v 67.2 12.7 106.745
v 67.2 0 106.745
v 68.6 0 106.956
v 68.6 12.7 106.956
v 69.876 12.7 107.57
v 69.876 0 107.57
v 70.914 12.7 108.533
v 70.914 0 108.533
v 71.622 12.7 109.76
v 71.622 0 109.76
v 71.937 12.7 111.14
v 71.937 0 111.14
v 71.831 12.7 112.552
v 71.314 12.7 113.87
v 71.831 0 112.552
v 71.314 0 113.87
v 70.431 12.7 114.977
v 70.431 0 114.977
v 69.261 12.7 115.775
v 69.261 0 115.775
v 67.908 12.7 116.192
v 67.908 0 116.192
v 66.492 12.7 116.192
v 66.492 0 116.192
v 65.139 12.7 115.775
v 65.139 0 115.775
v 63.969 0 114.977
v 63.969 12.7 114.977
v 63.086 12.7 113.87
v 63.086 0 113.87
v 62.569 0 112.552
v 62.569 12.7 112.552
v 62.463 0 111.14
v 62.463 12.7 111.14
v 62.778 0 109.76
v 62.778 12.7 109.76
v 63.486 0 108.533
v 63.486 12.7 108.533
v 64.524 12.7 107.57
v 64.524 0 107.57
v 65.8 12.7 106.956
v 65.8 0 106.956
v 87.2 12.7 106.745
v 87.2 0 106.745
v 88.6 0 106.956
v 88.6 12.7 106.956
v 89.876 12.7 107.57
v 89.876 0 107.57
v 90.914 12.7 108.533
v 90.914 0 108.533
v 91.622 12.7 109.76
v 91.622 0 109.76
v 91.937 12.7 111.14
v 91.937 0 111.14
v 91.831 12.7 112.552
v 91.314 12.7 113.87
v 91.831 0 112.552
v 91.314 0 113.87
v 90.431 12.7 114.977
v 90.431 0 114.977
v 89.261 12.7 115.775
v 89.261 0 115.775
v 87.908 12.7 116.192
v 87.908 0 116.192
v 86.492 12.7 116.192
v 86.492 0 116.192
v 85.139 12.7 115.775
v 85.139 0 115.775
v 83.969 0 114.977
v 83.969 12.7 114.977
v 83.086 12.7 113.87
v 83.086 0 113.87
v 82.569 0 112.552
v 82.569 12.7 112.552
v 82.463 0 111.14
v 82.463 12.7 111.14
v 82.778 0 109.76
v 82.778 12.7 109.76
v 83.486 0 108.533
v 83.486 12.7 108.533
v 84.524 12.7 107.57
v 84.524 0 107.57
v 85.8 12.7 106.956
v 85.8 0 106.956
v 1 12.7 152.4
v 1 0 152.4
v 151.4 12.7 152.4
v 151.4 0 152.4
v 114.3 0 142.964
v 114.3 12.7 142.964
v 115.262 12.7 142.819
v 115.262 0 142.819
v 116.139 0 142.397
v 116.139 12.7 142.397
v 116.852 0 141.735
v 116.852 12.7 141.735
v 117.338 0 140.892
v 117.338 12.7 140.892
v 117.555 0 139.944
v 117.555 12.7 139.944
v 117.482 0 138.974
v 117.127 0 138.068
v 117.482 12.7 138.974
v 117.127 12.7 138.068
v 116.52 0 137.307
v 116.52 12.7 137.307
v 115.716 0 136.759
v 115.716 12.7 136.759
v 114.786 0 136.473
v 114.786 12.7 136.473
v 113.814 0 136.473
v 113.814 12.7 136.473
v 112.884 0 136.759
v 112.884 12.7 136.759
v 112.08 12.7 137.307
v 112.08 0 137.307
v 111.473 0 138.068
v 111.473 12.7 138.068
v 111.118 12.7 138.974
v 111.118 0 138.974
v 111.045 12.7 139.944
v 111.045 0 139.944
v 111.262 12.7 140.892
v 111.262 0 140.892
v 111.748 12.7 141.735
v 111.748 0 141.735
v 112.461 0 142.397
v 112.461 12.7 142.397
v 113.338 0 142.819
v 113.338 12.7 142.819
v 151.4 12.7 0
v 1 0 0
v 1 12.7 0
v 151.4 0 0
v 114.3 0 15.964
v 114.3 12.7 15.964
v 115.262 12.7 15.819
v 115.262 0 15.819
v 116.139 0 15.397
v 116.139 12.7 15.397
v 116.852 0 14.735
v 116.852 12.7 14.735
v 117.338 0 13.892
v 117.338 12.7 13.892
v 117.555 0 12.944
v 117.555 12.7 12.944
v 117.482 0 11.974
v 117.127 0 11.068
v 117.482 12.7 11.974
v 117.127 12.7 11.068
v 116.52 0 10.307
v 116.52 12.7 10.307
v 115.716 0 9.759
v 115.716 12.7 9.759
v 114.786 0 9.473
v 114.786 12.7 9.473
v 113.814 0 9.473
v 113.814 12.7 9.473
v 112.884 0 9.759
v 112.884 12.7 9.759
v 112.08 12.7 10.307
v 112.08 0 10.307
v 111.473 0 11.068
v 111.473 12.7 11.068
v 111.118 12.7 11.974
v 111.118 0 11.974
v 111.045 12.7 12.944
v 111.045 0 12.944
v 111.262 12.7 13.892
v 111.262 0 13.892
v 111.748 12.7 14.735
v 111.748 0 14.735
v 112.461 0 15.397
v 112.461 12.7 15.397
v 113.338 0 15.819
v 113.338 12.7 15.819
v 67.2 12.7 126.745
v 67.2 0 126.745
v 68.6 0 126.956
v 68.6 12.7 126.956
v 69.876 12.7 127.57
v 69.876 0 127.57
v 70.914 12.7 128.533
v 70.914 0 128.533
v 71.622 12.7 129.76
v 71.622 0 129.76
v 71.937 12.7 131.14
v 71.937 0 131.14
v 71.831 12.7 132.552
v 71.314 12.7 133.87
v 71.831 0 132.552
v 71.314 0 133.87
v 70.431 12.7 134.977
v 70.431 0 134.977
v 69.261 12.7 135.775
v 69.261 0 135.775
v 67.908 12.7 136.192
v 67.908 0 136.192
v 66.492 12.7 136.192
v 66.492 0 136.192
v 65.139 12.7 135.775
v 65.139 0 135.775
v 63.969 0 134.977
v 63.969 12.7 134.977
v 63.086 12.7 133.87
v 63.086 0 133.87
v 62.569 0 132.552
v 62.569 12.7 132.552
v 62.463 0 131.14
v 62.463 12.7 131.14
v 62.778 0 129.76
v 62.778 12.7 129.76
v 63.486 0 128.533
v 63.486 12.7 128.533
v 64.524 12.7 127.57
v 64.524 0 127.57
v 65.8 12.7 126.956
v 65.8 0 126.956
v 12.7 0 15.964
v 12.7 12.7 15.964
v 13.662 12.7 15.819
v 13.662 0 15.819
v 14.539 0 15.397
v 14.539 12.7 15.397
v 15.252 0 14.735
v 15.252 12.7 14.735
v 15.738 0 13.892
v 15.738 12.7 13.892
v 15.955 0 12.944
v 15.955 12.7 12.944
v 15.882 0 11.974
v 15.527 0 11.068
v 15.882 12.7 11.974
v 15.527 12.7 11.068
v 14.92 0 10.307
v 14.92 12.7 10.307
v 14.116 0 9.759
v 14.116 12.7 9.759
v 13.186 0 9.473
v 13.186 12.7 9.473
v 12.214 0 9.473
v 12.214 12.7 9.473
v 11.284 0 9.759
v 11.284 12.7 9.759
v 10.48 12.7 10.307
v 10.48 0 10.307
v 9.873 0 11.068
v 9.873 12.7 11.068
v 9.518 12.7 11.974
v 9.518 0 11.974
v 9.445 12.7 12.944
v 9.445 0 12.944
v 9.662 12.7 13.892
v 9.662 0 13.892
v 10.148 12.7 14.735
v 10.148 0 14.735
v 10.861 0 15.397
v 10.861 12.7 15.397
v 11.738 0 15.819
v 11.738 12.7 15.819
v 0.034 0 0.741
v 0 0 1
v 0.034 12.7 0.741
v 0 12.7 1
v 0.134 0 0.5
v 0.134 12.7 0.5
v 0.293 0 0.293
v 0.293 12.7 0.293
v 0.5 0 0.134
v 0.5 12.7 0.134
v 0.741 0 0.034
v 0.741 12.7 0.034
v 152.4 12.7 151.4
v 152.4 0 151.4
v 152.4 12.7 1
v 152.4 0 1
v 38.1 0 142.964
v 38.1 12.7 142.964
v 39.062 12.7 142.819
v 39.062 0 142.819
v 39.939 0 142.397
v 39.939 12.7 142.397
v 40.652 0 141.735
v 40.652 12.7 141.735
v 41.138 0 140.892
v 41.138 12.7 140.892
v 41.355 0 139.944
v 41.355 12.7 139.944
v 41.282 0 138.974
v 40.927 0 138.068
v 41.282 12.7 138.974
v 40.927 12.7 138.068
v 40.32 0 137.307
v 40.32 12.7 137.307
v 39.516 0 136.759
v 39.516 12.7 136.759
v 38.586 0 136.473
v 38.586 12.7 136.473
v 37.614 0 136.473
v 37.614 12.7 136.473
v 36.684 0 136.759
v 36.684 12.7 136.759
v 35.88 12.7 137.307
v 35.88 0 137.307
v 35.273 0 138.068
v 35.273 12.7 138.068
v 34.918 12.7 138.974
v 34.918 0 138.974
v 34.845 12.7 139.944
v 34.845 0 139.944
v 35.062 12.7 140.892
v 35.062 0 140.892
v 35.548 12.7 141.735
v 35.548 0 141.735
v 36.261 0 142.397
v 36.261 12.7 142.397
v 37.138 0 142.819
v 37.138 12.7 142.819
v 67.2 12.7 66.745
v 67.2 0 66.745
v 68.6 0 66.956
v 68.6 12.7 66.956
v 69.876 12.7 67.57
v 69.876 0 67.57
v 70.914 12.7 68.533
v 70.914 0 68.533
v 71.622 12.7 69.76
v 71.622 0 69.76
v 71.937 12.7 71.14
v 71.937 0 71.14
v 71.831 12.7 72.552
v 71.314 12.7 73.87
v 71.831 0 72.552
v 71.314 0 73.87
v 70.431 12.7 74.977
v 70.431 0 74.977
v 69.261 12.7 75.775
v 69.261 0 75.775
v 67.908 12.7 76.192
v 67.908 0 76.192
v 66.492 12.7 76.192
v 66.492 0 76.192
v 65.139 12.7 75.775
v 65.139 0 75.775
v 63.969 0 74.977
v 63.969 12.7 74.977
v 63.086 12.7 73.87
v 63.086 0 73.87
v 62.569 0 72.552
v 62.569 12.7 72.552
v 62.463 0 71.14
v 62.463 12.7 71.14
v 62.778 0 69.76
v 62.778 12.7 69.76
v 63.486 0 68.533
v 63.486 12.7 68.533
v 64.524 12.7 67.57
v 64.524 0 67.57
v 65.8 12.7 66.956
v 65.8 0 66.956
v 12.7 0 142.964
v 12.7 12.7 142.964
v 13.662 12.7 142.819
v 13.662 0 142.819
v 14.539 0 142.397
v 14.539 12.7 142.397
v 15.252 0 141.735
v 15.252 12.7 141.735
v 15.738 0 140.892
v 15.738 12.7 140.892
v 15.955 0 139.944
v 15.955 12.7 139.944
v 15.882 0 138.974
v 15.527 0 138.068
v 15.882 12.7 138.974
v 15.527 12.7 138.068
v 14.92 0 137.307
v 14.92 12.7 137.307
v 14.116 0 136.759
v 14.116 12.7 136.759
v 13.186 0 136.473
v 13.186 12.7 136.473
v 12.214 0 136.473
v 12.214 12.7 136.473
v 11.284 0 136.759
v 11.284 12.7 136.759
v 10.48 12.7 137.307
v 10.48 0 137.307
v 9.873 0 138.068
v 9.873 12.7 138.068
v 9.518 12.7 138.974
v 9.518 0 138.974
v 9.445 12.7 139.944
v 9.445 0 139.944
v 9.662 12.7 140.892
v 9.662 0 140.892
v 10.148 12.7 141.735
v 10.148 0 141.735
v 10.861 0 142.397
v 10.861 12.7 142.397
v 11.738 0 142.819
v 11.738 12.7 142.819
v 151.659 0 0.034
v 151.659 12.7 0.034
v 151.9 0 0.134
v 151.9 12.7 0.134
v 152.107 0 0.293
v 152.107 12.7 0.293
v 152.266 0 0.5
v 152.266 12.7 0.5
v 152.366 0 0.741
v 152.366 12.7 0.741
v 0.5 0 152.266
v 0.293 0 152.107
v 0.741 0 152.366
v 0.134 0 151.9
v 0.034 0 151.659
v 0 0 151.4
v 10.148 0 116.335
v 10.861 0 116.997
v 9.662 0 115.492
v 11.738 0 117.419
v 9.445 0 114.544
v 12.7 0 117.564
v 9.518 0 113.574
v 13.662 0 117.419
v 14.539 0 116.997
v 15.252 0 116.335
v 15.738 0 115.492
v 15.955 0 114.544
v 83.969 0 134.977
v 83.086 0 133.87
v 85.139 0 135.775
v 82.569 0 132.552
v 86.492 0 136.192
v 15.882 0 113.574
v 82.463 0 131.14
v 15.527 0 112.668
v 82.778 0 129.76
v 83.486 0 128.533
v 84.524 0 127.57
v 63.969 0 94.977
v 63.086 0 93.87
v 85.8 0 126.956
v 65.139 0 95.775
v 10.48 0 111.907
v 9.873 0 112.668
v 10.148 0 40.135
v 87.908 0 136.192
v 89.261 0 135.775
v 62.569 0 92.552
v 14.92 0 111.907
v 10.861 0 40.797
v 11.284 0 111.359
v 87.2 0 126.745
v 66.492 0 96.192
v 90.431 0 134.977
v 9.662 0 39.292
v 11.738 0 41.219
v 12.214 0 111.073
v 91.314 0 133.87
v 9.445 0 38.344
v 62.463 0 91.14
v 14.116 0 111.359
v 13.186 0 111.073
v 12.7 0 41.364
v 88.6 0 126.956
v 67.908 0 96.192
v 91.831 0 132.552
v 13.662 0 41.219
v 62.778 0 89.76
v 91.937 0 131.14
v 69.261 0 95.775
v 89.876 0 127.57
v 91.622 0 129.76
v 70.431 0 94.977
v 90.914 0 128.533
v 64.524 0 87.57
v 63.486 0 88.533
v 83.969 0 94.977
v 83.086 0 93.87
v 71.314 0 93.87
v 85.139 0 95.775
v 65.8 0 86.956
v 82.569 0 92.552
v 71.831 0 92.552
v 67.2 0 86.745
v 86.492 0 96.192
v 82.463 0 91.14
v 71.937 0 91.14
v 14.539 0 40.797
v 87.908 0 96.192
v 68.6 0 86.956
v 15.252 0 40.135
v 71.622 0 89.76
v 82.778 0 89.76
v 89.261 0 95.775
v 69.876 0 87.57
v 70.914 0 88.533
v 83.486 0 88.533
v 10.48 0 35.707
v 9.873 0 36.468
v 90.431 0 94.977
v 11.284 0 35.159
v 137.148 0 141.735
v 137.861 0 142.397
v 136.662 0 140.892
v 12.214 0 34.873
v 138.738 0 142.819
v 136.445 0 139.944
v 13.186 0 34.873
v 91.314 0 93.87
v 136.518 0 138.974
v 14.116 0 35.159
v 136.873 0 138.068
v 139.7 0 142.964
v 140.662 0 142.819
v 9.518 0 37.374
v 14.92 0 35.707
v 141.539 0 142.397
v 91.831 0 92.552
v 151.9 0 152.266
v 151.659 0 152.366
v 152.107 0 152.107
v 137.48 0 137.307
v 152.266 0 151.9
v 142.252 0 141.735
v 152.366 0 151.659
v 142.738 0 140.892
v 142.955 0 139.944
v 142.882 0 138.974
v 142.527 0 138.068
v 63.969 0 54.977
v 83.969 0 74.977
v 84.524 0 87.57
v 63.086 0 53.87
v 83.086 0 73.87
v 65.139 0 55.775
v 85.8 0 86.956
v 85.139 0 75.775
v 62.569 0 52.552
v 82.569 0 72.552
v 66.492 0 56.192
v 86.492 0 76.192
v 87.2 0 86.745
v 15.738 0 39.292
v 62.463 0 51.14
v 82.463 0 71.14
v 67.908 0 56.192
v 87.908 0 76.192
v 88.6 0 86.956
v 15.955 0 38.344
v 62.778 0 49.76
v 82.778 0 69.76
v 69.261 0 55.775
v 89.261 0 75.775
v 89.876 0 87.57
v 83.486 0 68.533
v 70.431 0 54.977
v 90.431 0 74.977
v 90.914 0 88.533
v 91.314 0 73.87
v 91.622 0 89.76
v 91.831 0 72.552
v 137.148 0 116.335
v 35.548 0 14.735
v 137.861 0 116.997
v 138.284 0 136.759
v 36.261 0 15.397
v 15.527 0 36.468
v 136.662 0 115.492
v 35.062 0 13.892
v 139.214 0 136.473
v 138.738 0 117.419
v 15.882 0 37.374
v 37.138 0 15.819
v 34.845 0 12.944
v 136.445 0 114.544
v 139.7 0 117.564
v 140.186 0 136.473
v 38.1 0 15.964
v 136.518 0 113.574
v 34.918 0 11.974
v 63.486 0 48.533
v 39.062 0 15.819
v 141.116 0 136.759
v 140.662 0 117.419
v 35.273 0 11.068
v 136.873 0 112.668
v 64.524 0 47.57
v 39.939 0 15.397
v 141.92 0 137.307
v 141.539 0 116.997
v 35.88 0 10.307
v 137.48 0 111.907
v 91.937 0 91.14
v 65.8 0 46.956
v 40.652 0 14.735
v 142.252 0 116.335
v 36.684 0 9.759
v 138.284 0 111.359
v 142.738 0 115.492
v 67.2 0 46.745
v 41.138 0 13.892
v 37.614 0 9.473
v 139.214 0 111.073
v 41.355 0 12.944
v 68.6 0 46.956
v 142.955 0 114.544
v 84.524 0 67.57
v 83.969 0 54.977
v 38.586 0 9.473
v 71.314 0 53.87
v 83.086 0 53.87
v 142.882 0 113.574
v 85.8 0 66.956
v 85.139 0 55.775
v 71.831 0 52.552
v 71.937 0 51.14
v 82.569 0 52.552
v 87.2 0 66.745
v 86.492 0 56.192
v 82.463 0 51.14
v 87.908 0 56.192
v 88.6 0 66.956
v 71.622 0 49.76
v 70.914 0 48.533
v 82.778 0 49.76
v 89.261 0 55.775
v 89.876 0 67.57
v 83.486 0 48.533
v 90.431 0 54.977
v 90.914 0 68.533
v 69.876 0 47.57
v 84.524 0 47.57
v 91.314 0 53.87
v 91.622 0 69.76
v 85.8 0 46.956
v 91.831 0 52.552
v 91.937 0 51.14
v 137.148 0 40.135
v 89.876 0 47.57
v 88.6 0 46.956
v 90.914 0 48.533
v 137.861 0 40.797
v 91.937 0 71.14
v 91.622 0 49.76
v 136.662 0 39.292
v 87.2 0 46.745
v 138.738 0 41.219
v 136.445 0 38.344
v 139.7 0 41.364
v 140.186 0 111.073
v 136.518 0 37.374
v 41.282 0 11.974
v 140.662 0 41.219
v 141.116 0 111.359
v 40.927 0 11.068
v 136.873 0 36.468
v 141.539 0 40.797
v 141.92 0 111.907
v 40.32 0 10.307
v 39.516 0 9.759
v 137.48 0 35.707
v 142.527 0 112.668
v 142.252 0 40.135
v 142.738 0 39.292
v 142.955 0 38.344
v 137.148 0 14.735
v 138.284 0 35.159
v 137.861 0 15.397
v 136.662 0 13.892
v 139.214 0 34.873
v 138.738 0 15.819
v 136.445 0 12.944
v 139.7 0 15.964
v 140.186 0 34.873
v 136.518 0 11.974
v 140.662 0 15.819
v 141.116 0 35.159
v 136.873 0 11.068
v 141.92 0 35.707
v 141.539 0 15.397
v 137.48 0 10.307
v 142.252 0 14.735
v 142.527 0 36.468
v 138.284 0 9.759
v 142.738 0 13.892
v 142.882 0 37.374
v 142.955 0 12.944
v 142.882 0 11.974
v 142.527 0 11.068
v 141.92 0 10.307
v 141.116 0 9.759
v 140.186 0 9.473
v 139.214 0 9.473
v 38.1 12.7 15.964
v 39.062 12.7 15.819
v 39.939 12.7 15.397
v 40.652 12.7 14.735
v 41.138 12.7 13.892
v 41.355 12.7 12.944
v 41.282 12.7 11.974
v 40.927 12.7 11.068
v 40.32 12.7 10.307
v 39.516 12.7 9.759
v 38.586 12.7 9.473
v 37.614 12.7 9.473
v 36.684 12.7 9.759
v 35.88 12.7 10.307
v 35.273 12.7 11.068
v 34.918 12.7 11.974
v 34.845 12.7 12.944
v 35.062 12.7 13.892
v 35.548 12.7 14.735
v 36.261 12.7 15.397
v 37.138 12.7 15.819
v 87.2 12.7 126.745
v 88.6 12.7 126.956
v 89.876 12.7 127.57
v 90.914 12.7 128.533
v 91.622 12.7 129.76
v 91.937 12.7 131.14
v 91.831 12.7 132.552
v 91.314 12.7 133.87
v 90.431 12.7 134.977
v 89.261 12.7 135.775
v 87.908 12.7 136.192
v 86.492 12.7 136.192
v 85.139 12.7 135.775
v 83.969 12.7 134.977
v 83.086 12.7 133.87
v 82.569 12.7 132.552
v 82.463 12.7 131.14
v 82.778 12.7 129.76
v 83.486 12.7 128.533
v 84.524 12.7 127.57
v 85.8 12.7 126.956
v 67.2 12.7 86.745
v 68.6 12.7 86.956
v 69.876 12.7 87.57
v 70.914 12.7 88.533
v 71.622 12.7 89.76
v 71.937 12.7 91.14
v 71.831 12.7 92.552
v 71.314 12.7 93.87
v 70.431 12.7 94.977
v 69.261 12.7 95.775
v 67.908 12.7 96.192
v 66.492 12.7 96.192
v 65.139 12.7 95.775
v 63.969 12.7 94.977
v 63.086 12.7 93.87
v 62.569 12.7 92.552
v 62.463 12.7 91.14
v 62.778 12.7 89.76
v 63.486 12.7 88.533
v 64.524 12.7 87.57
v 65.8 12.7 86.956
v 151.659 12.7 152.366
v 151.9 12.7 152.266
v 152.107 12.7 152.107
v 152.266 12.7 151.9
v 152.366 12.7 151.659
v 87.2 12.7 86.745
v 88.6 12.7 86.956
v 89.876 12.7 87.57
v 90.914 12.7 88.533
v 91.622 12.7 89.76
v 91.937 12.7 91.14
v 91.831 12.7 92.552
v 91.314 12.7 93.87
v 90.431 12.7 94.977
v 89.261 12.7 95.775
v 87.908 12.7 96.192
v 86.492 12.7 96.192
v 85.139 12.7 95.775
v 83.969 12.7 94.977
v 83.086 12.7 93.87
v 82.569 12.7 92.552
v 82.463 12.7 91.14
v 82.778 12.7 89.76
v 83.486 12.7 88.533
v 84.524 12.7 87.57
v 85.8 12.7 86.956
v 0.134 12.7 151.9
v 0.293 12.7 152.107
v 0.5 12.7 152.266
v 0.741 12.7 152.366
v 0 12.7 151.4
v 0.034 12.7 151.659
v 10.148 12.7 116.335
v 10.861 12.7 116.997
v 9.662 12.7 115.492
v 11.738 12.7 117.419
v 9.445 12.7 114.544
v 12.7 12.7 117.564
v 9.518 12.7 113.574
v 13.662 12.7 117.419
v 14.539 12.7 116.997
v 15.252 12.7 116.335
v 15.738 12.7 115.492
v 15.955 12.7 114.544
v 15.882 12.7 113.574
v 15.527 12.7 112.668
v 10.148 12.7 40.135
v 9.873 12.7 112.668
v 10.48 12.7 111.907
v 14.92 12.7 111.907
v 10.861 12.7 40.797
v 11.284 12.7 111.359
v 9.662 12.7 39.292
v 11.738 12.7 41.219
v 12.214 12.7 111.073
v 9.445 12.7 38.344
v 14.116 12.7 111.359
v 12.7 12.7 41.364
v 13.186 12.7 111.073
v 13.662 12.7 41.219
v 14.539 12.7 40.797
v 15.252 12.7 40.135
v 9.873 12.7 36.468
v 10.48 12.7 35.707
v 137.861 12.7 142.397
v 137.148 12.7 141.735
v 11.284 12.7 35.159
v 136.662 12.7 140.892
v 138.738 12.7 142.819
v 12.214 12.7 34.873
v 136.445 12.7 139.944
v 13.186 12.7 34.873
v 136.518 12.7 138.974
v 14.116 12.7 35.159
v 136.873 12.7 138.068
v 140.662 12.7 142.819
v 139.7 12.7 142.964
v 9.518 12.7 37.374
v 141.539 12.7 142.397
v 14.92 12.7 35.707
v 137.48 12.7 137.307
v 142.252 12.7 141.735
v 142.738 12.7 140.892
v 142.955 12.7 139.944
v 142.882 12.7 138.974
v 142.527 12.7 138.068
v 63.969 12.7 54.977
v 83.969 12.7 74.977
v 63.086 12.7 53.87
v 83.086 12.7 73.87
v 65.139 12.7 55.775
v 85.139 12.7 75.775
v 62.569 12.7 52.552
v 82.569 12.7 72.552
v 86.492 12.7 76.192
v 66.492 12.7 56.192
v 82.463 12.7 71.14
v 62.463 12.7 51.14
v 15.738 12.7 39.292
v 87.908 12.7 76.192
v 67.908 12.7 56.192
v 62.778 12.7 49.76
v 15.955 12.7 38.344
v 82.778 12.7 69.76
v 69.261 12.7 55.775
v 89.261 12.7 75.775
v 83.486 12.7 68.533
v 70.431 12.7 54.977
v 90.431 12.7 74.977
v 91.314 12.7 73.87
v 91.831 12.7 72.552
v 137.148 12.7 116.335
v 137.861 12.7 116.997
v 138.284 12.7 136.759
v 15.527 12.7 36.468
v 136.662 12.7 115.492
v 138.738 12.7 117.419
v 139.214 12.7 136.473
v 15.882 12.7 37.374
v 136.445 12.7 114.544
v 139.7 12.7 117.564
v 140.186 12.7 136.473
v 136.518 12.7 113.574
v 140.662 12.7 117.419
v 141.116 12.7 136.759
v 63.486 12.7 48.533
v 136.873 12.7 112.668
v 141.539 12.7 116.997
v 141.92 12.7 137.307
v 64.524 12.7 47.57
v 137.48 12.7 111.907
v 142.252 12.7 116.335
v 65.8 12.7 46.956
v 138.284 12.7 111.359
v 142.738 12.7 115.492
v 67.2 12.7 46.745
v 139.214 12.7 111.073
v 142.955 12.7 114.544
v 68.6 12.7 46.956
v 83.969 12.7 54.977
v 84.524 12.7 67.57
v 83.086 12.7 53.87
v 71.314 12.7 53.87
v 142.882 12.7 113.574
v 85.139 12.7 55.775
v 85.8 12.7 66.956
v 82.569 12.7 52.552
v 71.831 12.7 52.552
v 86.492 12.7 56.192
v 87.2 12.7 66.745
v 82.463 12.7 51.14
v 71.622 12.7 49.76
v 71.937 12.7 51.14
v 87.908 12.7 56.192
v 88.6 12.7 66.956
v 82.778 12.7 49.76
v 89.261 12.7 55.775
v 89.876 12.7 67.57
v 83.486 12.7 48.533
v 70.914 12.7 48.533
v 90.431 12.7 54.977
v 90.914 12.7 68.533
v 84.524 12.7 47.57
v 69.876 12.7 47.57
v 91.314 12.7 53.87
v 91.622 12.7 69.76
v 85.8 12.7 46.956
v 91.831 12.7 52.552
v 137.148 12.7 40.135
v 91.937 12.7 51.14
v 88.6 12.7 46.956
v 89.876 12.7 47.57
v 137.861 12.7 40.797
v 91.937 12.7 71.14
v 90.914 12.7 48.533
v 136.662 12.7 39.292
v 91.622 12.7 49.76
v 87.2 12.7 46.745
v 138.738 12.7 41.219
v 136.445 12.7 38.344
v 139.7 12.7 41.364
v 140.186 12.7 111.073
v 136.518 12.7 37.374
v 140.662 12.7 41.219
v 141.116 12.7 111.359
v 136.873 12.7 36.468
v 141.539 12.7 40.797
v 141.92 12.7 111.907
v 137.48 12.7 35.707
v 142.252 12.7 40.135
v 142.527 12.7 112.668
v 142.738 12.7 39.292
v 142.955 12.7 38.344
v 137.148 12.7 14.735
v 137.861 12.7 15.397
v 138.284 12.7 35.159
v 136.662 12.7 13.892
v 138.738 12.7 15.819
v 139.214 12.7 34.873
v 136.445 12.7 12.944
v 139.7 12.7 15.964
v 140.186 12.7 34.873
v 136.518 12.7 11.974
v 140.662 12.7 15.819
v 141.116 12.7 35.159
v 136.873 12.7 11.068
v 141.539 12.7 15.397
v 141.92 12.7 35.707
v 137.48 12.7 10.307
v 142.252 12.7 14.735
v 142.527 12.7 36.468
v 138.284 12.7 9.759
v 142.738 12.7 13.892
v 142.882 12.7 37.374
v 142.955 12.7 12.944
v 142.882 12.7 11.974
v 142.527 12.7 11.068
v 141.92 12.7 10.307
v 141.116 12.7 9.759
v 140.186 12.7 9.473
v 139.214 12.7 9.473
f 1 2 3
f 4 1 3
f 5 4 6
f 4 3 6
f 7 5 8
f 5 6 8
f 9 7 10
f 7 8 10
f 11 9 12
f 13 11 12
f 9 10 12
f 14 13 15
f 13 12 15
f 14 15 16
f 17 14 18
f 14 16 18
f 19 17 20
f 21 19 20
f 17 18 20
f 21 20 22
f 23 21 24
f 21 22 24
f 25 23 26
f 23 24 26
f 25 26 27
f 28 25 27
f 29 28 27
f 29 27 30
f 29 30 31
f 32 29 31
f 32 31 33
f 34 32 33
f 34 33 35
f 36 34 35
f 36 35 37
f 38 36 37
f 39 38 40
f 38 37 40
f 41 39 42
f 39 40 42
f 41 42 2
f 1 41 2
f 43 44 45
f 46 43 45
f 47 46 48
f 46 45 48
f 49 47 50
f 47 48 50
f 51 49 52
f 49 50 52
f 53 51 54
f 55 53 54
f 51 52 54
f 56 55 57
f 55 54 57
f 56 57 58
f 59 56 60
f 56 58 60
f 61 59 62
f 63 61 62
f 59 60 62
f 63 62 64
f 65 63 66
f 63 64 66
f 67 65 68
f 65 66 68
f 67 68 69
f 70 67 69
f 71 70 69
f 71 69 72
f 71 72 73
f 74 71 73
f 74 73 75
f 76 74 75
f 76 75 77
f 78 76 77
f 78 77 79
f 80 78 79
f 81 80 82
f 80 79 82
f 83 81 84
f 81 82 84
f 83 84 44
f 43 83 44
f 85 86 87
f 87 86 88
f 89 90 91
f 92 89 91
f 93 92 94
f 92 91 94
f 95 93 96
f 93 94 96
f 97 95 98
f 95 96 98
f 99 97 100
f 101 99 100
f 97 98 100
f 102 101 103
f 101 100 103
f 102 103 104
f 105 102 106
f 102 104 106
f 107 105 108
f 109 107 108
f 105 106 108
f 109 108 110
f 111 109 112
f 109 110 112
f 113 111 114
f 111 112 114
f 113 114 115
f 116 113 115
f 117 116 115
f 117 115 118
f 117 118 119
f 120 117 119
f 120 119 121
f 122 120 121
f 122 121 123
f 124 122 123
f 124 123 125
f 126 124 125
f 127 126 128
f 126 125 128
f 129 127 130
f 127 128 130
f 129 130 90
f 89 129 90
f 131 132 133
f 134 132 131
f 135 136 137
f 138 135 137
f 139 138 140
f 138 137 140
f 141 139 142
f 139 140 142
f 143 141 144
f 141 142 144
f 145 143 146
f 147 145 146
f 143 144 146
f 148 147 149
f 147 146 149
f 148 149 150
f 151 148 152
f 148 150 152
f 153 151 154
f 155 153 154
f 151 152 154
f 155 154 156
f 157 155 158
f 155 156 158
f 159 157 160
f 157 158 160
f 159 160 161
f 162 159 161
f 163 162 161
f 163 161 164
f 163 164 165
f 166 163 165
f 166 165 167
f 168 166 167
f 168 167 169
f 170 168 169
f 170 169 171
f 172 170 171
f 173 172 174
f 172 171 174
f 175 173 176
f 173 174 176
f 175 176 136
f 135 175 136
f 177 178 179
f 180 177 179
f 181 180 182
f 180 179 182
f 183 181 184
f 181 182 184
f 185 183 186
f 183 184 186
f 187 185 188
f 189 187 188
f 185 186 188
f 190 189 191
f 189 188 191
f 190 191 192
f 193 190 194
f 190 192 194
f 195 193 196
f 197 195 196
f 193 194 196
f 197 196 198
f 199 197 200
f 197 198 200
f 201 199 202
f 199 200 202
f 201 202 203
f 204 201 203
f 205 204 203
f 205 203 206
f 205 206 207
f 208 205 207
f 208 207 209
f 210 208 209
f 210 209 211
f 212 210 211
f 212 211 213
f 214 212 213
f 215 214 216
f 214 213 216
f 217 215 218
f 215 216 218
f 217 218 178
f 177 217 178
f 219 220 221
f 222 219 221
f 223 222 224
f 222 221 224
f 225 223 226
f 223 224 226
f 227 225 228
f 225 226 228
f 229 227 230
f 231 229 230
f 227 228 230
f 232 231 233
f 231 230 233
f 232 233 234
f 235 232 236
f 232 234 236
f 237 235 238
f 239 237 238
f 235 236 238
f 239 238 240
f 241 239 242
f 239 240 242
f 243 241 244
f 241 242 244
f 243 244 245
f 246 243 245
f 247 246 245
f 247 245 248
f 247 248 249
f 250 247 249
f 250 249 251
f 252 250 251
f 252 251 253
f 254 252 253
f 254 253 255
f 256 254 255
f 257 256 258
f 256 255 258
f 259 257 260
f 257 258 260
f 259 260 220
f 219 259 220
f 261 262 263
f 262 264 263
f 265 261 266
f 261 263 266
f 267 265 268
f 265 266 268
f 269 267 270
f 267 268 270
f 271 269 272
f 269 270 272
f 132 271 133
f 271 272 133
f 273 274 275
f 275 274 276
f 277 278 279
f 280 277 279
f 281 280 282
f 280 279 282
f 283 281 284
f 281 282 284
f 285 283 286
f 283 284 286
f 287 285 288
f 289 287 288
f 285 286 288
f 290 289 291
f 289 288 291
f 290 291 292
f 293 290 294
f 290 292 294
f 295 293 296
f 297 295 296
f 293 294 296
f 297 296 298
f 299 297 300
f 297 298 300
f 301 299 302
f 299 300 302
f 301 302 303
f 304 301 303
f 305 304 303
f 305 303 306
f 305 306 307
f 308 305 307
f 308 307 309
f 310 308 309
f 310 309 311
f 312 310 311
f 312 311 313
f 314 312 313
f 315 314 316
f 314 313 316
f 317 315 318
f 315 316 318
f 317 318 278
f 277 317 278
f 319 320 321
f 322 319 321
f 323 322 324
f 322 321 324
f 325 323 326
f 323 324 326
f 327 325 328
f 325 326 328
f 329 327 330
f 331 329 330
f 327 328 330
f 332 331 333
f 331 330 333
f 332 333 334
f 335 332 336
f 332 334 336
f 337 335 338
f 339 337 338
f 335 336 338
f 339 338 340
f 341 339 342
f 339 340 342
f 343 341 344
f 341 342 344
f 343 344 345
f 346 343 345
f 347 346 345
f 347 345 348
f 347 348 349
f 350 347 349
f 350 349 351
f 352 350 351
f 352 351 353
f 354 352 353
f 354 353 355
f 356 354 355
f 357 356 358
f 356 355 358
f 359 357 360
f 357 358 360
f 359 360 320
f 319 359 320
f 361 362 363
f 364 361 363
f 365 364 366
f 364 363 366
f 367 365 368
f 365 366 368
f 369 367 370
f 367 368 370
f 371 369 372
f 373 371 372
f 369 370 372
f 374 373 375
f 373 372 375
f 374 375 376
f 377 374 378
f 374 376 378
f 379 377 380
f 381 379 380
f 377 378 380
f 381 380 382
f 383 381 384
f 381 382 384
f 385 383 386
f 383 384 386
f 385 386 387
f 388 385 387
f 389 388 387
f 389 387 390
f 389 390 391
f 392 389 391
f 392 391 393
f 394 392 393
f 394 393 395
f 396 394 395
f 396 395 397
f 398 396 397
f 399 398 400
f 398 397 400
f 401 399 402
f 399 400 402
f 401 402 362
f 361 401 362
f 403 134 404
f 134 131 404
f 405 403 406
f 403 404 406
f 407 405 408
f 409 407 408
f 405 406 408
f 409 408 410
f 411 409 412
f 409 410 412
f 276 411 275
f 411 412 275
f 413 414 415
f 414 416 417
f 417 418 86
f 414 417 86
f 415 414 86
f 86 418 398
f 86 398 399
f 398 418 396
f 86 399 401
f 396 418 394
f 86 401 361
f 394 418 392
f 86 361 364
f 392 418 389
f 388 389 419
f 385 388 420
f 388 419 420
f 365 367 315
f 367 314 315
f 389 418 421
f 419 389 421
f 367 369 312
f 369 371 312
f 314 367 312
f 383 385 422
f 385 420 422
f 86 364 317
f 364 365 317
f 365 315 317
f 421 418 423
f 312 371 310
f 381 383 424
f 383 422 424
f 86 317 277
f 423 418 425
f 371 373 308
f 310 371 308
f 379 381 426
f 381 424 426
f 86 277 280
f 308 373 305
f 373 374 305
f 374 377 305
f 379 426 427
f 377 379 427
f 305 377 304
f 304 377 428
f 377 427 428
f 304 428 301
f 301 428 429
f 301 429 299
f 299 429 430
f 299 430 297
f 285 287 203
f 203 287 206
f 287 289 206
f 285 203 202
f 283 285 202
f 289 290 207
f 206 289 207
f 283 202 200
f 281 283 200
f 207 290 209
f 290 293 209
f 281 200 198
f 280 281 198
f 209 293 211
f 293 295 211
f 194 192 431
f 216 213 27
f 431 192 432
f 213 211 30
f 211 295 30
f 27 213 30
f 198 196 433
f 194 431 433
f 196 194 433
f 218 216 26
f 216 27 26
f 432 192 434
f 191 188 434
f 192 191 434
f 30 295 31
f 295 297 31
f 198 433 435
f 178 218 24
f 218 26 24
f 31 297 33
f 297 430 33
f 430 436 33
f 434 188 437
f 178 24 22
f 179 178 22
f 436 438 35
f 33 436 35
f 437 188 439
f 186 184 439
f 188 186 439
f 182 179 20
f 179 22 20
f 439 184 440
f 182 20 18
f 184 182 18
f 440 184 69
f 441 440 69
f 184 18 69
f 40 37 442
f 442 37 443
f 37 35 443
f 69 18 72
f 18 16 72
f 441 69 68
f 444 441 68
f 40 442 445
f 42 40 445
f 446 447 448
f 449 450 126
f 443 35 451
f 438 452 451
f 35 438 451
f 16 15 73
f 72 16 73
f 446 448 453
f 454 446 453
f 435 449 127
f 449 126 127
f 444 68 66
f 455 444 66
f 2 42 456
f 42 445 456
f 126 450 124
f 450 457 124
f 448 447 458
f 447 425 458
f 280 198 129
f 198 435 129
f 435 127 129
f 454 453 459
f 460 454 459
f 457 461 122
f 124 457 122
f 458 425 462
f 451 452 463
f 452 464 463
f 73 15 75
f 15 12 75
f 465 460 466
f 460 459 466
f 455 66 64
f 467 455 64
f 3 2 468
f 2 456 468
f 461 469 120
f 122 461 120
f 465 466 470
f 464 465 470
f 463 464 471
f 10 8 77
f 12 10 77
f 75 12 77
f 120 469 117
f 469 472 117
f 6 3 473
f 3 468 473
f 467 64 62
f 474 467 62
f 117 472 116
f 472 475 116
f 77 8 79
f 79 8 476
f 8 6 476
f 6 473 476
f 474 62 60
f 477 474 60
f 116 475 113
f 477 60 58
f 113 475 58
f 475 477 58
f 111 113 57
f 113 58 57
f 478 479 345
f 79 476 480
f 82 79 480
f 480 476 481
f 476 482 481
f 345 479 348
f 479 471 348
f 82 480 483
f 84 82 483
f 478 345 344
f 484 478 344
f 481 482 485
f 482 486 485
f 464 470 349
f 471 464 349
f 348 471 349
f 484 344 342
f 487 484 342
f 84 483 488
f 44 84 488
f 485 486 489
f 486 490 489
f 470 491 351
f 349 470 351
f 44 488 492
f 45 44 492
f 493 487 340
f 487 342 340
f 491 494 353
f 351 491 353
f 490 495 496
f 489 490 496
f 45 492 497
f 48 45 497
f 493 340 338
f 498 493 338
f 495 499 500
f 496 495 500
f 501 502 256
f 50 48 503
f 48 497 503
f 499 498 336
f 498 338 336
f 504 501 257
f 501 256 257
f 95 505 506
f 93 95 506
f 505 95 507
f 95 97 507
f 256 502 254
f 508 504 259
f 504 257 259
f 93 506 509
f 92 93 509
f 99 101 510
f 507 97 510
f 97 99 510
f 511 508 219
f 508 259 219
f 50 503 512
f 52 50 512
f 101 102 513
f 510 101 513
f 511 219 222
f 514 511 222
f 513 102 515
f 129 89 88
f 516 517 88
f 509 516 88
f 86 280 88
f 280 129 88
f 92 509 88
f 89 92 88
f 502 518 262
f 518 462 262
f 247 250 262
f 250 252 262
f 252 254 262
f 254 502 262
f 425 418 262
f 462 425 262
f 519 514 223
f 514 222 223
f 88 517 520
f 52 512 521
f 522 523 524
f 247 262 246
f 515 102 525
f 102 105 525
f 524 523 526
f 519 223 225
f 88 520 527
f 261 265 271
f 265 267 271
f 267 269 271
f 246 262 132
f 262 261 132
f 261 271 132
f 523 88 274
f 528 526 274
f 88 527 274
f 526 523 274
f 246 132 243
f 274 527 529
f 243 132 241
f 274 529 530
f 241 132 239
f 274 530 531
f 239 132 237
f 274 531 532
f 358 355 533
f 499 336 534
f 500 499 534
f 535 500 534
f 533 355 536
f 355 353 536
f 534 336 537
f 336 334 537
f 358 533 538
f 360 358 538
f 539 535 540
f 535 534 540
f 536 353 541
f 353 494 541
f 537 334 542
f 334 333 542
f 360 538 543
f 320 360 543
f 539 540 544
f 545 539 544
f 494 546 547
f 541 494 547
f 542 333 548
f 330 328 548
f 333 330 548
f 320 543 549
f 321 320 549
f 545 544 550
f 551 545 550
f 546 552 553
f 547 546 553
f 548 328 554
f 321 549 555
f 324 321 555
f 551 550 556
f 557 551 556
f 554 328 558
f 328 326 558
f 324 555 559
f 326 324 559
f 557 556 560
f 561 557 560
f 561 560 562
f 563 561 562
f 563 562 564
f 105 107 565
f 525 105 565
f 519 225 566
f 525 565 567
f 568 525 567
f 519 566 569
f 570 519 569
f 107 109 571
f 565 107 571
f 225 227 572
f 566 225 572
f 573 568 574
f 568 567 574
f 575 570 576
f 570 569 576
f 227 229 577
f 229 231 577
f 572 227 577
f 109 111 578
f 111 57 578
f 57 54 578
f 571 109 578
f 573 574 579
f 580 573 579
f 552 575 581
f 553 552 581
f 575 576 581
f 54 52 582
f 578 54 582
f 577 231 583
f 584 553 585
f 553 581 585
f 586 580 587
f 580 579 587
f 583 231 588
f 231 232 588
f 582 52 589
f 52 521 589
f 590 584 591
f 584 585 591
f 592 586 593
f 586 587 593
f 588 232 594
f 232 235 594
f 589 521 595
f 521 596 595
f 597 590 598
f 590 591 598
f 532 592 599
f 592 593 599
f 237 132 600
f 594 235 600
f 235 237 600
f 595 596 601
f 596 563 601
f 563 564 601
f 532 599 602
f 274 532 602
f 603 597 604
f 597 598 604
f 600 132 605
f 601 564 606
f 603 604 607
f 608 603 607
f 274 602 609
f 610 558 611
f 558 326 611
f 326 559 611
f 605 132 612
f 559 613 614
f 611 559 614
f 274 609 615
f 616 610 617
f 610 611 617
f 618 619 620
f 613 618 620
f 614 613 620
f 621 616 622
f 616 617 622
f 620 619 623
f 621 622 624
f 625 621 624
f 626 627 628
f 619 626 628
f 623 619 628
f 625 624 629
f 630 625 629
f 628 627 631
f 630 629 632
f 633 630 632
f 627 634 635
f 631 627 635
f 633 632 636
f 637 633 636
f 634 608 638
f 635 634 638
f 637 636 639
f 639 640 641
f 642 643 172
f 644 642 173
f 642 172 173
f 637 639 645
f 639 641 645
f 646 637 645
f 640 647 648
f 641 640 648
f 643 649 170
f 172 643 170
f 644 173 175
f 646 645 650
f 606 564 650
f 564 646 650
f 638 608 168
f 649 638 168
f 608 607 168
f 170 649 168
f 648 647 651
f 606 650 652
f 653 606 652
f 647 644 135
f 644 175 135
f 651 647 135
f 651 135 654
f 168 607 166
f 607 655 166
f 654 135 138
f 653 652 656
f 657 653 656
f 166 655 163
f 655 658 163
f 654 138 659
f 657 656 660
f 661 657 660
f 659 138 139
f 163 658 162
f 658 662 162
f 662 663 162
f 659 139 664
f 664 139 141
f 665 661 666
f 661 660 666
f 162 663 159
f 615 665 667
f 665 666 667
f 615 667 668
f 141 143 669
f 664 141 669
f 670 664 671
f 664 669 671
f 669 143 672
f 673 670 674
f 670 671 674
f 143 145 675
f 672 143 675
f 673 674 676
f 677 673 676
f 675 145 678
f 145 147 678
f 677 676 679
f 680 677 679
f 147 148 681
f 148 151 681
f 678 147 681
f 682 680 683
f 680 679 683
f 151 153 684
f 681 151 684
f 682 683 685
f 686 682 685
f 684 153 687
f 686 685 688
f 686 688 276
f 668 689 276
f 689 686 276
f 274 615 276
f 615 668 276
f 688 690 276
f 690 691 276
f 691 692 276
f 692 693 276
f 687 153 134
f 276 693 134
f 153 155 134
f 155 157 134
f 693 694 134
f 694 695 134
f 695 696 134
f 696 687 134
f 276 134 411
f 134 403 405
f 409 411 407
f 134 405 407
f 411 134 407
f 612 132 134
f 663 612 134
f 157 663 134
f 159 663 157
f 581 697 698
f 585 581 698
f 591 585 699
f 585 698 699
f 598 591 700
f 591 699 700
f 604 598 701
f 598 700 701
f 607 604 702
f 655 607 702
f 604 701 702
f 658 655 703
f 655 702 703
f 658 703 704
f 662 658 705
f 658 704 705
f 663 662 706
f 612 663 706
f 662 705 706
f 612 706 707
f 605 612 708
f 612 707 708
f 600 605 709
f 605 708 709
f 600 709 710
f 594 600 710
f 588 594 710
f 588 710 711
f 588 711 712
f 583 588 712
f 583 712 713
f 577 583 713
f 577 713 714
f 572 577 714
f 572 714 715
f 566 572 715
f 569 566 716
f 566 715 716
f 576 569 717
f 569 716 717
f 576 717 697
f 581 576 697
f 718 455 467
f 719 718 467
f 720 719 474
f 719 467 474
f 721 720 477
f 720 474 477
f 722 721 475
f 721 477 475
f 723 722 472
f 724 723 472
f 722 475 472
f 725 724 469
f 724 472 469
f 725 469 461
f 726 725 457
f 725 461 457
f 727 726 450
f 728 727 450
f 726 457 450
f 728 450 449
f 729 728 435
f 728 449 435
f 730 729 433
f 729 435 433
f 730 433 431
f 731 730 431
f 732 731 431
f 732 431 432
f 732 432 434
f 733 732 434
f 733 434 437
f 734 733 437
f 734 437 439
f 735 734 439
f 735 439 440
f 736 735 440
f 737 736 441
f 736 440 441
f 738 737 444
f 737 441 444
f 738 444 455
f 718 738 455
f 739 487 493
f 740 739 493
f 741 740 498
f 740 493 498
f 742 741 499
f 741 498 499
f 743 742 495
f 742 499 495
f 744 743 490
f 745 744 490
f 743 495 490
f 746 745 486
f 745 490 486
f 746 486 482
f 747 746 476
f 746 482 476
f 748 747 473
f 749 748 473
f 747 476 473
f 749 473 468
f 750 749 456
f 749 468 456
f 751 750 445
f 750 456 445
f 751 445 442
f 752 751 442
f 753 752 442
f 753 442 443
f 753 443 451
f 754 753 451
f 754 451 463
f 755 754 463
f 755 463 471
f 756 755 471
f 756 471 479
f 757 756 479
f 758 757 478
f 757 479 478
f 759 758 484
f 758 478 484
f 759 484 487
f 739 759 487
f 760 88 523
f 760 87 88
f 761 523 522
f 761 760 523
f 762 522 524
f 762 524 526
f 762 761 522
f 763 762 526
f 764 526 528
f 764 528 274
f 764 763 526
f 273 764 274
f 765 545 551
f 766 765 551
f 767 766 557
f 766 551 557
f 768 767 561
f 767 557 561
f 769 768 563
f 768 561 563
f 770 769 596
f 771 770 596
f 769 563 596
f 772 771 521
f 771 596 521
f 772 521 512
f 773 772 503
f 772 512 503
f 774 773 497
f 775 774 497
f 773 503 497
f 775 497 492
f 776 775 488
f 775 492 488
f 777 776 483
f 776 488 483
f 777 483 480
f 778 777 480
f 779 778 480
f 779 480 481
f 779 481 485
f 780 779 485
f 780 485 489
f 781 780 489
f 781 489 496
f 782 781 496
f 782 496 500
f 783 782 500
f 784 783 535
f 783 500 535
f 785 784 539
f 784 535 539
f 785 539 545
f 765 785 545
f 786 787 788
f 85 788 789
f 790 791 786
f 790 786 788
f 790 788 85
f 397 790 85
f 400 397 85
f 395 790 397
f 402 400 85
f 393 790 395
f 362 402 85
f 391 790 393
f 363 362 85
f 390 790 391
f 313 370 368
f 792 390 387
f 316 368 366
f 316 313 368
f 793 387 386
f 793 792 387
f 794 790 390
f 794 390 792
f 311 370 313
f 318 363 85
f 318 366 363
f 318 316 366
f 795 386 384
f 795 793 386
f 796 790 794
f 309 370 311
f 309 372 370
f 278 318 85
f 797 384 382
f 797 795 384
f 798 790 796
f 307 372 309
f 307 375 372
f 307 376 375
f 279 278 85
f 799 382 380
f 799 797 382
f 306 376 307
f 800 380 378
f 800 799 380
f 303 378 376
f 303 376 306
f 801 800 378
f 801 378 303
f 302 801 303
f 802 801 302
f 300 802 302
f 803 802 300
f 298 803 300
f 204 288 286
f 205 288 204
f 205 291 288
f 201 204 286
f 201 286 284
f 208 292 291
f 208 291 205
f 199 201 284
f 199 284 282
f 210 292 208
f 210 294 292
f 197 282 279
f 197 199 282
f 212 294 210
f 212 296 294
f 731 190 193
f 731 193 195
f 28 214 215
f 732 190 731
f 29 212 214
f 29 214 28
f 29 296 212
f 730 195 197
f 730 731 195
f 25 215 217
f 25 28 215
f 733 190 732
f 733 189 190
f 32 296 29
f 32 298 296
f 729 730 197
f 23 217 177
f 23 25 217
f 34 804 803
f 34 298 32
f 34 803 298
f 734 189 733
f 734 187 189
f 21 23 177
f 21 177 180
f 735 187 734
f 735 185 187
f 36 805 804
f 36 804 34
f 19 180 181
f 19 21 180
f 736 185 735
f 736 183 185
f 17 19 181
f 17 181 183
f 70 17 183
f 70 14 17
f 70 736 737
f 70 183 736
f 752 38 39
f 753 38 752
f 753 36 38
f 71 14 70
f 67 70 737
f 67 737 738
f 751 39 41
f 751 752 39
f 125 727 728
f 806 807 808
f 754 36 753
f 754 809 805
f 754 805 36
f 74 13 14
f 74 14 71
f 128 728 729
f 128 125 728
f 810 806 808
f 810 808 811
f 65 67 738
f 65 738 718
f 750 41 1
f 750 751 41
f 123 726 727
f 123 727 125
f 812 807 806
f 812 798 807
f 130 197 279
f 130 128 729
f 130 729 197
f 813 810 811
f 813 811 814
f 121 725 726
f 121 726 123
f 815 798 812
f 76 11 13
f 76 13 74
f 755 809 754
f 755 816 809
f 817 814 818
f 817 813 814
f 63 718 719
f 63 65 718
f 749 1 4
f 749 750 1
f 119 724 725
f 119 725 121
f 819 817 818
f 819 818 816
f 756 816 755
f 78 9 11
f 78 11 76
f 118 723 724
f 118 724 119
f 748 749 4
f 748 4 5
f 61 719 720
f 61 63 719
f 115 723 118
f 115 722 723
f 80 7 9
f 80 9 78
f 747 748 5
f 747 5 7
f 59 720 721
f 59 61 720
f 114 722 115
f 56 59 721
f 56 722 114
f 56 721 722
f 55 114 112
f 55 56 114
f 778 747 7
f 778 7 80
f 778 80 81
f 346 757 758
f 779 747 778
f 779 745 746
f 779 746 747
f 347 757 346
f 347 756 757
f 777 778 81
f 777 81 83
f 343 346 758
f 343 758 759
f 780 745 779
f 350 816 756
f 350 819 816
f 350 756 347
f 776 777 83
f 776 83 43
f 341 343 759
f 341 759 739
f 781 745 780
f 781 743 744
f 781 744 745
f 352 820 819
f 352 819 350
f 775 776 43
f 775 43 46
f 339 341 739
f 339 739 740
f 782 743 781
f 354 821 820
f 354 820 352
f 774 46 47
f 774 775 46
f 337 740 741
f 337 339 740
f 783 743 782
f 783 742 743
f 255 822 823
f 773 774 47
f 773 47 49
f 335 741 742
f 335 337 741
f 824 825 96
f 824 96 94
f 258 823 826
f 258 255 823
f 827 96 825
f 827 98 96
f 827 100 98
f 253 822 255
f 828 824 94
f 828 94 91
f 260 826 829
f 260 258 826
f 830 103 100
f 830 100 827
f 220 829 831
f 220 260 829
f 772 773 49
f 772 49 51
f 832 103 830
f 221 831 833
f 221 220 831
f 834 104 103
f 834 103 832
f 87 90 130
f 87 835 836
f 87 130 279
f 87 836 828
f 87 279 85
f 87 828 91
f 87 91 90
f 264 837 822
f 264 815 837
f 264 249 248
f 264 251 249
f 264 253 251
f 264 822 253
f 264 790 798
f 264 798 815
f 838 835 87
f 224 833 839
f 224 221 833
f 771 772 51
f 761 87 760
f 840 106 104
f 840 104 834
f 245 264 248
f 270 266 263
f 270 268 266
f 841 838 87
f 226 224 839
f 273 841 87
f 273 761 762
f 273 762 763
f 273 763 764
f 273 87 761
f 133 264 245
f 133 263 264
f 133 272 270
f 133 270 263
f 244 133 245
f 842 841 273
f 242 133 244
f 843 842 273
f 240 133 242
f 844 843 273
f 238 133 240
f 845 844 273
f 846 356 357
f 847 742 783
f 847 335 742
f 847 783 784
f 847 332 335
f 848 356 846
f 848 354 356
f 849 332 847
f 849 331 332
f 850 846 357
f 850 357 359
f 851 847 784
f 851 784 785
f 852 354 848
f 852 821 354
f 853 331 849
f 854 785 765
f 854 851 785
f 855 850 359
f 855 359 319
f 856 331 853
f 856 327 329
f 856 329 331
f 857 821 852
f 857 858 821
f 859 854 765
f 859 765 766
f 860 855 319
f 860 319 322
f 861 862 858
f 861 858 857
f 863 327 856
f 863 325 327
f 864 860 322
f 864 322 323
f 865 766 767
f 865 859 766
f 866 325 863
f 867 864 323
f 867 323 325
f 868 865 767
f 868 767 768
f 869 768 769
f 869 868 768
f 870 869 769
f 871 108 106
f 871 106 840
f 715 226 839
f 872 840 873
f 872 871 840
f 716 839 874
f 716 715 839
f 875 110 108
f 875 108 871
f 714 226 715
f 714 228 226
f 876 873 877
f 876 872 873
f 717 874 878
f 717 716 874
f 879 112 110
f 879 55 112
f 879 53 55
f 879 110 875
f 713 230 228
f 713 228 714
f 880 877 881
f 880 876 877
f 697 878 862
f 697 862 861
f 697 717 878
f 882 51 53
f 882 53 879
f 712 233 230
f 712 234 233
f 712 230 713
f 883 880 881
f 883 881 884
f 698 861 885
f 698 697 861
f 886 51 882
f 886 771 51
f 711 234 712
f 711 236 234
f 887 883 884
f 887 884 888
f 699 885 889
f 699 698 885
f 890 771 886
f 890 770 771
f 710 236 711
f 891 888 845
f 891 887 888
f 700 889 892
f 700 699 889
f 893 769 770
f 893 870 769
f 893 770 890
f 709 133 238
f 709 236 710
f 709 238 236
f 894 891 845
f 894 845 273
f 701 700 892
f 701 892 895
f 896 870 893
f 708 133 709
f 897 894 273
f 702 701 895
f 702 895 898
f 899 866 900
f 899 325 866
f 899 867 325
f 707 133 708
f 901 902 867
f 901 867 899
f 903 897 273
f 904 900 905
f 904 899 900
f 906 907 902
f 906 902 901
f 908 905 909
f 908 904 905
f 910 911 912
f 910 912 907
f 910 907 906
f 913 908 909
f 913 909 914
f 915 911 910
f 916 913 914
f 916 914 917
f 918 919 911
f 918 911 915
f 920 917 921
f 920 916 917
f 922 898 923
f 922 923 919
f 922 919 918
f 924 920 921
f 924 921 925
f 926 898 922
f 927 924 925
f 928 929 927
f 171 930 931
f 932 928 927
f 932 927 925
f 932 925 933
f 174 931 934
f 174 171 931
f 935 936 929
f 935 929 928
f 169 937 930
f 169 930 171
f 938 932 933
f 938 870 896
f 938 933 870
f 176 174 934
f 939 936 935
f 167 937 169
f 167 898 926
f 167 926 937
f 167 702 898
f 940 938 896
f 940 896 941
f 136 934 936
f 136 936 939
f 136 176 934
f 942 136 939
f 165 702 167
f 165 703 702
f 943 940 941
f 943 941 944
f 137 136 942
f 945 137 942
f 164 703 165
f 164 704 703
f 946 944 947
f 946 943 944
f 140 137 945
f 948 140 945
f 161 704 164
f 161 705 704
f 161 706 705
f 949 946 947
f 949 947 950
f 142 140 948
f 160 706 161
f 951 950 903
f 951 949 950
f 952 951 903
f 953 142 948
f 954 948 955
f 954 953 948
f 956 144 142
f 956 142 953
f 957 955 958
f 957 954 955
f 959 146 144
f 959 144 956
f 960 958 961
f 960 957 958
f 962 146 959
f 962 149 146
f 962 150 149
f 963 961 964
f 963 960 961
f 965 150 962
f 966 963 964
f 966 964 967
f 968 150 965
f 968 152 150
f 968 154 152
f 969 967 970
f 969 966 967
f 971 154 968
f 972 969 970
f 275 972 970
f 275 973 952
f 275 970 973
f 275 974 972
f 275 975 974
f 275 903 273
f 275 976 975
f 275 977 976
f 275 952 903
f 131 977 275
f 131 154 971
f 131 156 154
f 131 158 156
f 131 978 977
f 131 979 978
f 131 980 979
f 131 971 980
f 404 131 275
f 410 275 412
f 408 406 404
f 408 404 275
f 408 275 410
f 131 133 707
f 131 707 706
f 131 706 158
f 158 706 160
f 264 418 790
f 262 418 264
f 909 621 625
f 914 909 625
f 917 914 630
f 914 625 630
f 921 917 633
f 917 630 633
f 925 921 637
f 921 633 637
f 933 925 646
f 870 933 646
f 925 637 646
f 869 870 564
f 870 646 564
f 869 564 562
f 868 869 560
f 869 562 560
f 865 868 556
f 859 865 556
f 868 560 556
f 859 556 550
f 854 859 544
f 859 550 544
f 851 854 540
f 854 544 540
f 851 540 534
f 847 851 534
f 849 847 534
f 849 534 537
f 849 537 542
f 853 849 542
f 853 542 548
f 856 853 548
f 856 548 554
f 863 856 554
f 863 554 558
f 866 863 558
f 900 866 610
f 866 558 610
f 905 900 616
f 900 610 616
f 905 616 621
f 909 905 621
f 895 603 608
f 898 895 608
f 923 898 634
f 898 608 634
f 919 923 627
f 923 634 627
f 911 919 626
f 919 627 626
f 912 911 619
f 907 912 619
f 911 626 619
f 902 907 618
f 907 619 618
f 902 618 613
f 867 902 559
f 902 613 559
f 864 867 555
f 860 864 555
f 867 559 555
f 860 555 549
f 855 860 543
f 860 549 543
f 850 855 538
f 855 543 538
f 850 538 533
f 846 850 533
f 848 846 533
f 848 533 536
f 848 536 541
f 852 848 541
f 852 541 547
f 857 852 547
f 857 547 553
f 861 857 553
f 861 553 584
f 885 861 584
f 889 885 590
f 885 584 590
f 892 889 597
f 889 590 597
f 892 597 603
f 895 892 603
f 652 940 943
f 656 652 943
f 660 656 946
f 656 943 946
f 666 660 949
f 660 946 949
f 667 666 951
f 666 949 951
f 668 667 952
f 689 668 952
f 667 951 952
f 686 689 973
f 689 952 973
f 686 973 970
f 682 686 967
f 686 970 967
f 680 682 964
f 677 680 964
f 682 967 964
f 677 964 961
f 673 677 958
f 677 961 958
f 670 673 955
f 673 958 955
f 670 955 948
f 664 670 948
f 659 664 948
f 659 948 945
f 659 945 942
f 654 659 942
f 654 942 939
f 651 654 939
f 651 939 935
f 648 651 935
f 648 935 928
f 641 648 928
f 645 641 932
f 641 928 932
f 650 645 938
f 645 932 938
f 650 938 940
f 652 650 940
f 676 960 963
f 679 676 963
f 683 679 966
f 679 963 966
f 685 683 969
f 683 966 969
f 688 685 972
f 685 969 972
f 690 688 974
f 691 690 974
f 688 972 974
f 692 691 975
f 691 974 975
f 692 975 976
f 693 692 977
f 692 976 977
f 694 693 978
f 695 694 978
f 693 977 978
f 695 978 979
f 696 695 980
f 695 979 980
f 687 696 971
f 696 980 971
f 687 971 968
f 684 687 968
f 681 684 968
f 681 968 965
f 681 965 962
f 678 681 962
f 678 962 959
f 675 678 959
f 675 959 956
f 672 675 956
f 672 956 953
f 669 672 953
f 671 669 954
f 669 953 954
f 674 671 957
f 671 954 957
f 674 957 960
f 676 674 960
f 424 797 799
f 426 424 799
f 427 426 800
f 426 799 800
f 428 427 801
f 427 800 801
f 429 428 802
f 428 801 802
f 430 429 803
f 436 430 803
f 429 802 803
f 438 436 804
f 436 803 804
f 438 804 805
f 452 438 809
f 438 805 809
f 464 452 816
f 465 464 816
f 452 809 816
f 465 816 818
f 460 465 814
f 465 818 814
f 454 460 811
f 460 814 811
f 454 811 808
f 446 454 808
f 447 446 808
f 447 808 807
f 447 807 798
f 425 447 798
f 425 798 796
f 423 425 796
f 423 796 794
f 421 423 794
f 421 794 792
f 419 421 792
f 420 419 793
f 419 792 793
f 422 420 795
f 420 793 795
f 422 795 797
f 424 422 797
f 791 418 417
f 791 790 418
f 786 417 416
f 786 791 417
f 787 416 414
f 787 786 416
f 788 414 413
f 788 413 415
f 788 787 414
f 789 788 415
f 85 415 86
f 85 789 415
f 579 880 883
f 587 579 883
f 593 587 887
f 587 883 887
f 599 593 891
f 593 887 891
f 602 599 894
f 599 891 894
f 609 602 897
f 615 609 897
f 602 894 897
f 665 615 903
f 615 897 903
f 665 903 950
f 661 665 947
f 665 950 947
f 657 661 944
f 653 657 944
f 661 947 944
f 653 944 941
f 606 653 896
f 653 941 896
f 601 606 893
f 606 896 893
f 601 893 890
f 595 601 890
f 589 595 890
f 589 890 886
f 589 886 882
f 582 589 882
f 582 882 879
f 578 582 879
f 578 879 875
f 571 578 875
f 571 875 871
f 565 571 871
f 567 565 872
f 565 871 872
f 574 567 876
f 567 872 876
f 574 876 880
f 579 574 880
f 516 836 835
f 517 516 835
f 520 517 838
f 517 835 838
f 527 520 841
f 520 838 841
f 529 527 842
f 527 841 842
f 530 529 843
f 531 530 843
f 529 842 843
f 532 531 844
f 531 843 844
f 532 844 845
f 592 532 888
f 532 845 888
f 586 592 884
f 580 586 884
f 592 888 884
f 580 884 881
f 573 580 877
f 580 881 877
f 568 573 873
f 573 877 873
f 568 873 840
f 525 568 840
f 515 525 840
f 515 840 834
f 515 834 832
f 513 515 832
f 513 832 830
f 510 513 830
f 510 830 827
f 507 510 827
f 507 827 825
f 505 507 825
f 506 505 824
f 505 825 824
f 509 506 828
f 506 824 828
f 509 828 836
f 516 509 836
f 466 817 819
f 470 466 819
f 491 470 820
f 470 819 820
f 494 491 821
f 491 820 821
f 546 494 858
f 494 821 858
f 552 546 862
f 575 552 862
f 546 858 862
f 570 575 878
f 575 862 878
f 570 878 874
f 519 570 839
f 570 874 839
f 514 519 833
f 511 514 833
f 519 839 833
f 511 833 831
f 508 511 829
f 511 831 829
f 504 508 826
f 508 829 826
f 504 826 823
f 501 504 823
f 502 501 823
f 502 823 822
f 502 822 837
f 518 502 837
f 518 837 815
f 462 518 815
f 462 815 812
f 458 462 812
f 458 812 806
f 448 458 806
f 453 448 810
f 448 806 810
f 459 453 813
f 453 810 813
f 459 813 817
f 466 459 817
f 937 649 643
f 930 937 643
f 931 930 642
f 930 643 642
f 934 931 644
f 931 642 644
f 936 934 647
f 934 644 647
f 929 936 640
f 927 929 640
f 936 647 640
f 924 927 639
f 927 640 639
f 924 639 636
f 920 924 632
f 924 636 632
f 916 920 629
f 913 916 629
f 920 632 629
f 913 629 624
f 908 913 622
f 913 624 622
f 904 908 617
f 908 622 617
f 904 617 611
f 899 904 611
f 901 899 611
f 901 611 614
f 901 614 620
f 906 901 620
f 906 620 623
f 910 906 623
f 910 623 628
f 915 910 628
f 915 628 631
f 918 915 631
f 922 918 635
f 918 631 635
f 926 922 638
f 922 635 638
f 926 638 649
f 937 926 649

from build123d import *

# Parameters (mm, degrees)
SKETCH1_W           = 152.4
SKETCH1_H           = 152.4
SKETCH1_R           = 4.75
BOSS_EXTRUDE1_DEPTH = 12.7
FILLET1_R           = 1
SKETCH11_R          = 3.2639
CUT_EXTRUDE1_DEPTH  = 12.7
SKETCH12_R          = 4.75
CUT_EXTRUDE2_DEPTH  = 12.7


with BuildPart() as part:
    # Sketch1 → Boss-Extrude1 (new body)
    # profile 1 of 13: a face of its own
    with BuildSketch(Plane(origin=(0, 0, 0), x_dir=(1, 0, 0), z_dir=(0, 1, 0))):
        with Locations((76.2, -76.2)):
            Rectangle(SKETCH1_W, SKETCH1_H)
        with Locations((12.7, -38.1)):
            Circle(SKETCH1_R, mode=Mode.SUBTRACT)
        with Locations((12.7, -114.3)):
            Circle(SKETCH1_R, mode=Mode.SUBTRACT)
        with Locations((38.1, -139.7)):
            Circle(SKETCH1_R, mode=Mode.SUBTRACT)
        with Locations((114.3, -139.7)):
            Circle(SKETCH1_R, mode=Mode.SUBTRACT)
        with Locations((139.7, -114.3)):
            Circle(SKETCH1_R, mode=Mode.SUBTRACT)
        with Locations((139.7, -38.1)):
            Circle(SKETCH1_R, mode=Mode.SUBTRACT)
        with Locations((114.3, -12.7)):
            Circle(SKETCH1_R, mode=Mode.SUBTRACT)
        with Locations((38.1, -12.7)):
            Circle(SKETCH1_R, mode=Mode.SUBTRACT)
        with Locations((12.7, -139.7)):
            Circle(SKETCH1_R, mode=Mode.SUBTRACT)
        with Locations((139.7, -139.7)):
            Circle(SKETCH1_R, mode=Mode.SUBTRACT)
        with Locations((139.7, -12.7)):
            Circle(SKETCH1_R, mode=Mode.SUBTRACT)
        with Locations((12.7, -12.7)):
            Circle(SKETCH1_R, mode=Mode.SUBTRACT)
    # profile 2 of 13: a face of its own
    with BuildSketch(Plane(origin=(0, 0, 0), x_dir=(1, 0, 0), z_dir=(0, 1, 0))):
        with Locations((12.7, -12.7)):
            Circle(SKETCH1_R)
    # profile 3 of 13: a face of its own
    with BuildSketch(Plane(origin=(0, 0, 0), x_dir=(1, 0, 0), z_dir=(0, 1, 0))):
        with Locations((139.7, -12.7)):
            Circle(SKETCH1_R)
    # profile 4 of 13: a face of its own
    with BuildSketch(Plane(origin=(0, 0, 0), x_dir=(1, 0, 0), z_dir=(0, 1, 0))):
        with Locations((139.7, -139.7)):
            Circle(SKETCH1_R)
    # profile 5 of 13: a face of its own
    with BuildSketch(Plane(origin=(0, 0, 0), x_dir=(1, 0, 0), z_dir=(0, 1, 0))):
        with Locations((12.7, -139.7)):
            Circle(SKETCH1_R)
    # profile 6 of 13: a face of its own
    with BuildSketch(Plane(origin=(0, 0, 0), x_dir=(1, 0, 0), z_dir=(0, 1, 0))):
        with Locations((38.1, -12.7)):
            Circle(SKETCH1_R)
    # profile 7 of 13: a face of its own
    with BuildSketch(Plane(origin=(0, 0, 0), x_dir=(1, 0, 0), z_dir=(0, 1, 0))):
        with Locations((12.7, -38.1)):
            Circle(SKETCH1_R)
    # profile 8 of 13: a face of its own
    with BuildSketch(Plane(origin=(0, 0, 0), x_dir=(1, 0, 0), z_dir=(0, 1, 0))):
        with Locations((139.7, -38.1)):
            Circle(SKETCH1_R)
    # profile 9 of 13: a face of its own
    with BuildSketch(Plane(origin=(0, 0, 0), x_dir=(1, 0, 0), z_dir=(0, 1, 0))):
        with Locations((114.3, -12.7)):
            Circle(SKETCH1_R)
    # profile 10 of 13: a face of its own
    with BuildSketch(Plane(origin=(0, 0, 0), x_dir=(1, 0, 0), z_dir=(0, 1, 0))):
        with Locations((139.7, -114.3)):
            Circle(SKETCH1_R)
    # profile 11 of 13: a face of its own
    with BuildSketch(Plane(origin=(0, 0, 0), x_dir=(1, 0, 0), z_dir=(0, 1, 0))):
        with Locations((114.3, -139.7)):
            Circle(SKETCH1_R)
    # profile 12 of 13: a face of its own
    with BuildSketch(Plane(origin=(0, 0, 0), x_dir=(1, 0, 0), z_dir=(0, 1, 0))):
        with Locations((12.7, -114.3)):
            Circle(SKETCH1_R)
    # profile 13 of 13: a face of its own
    with BuildSketch(Plane(origin=(0, 0, 0), x_dir=(1, 0, 0), z_dir=(0, 1, 0))):
        with Locations((38.1, -139.7)):
            Circle(SKETCH1_R)
    extrude(amount=BOSS_EXTRUDE1_DEPTH)

    # Fillet1
    fillet1_edges = [part.edges().sort_by_distance(p)[0] for p in [
        (152.4, 6.35, 152.4),
        (0, 6.35, 152.4),
        (0, 6.35, 0),
        (152.4, 6.35, 0),
    ]]
    fillet(fillet1_edges, radius=FILLET1_R)

    # Sketch11 → Cut-Extrude1 (cut)
    with BuildSketch(Plane(origin=(0, 12.7, 0), x_dir=(1, 0, 0), z_dir=(0, 1, 0))):
        with Locations(Location((38.1, -12.7, 0), (0, 0, 270))):
            Circle(SKETCH11_R)
        with Locations(Location((12.7, -12.7, 0), (0, 0, 270))):
            Circle(SKETCH11_R)
        with Locations(Location((139.7, -12.7, 0), (0, 0, 270))):
            Circle(SKETCH11_R)
        with Locations(Location((12.7, -38.1, 0), (0, 0, 270))):
            Circle(SKETCH11_R)
        with Locations(Location((114.3, -12.7, 0), (0, 0, 270))):
            Circle(SKETCH11_R)
        with Locations(Location((139.7, -38.1, 0), (0, 0, 270))):
            Circle(SKETCH11_R)
        with Locations(Location((139.7, -114.3, 0), (0, 0, 270))):
            Circle(SKETCH11_R)
        with Locations(Location((114.3, -139.7, 0), (0, 0, 270))):
            Circle(SKETCH11_R)
        with Locations(Location((12.7, -114.3, 0), (0, 0, 270))):
            Circle(SKETCH11_R)
        with Locations(Location((38.1, -139.7, 0), (0, 0, 270))):
            Circle(SKETCH11_R)
        with Locations(Location((139.7, -139.7, 0), (0, 0, 270))):
            Circle(SKETCH11_R)
        with Locations(Location((12.7, -139.7, 0), (0, 0, 270))):
            Circle(SKETCH11_R)
    extrude(amount=-CUT_EXTRUDE1_DEPTH, mode=Mode.SUBTRACT)

    # Sketch12 → Cut-Extrude2 (cut)
    with BuildSketch(Plane.XZ):
        with Locations(Location((67.2, 131.495, 0), (0, 0, 270))):
            Circle(SKETCH12_R)
        with Locations(Location((87.2, 131.495, 0), (0, 0, 270))):
            Circle(SKETCH12_R)
        with Locations(Location((87.2, 111.495, 0), (0, 0, 270))):
            Circle(SKETCH12_R)
        with Locations(Location((67.2, 111.495, 0), (0, 0, 270))):
            Circle(SKETCH12_R)
        with Locations(Location((67.2, 91.495, 0), (0, 0, 270))):
            Circle(SKETCH12_R)
        with Locations(Location((67.2, 71.495, 0), (0, 0, 270))):
            Circle(SKETCH12_R)
        with Locations(Location((67.2, 51.495, 0), (0, 0, 270))):
            Circle(SKETCH12_R)
        with Locations(Location((87.2, 51.495, 0), (0, 0, 270))):
            Circle(SKETCH12_R)
        with Locations(Location((87.2, 71.495, 0), (0, 0, 270))):
            Circle(SKETCH12_R)
        with Locations(Location((87.2, 91.495, 0), (0, 0, 270))):
            Circle(SKETCH12_R)
    extrude(amount=-CUT_EXTRUDE2_DEPTH, mode=Mode.SUBTRACT)


solid = part.part
